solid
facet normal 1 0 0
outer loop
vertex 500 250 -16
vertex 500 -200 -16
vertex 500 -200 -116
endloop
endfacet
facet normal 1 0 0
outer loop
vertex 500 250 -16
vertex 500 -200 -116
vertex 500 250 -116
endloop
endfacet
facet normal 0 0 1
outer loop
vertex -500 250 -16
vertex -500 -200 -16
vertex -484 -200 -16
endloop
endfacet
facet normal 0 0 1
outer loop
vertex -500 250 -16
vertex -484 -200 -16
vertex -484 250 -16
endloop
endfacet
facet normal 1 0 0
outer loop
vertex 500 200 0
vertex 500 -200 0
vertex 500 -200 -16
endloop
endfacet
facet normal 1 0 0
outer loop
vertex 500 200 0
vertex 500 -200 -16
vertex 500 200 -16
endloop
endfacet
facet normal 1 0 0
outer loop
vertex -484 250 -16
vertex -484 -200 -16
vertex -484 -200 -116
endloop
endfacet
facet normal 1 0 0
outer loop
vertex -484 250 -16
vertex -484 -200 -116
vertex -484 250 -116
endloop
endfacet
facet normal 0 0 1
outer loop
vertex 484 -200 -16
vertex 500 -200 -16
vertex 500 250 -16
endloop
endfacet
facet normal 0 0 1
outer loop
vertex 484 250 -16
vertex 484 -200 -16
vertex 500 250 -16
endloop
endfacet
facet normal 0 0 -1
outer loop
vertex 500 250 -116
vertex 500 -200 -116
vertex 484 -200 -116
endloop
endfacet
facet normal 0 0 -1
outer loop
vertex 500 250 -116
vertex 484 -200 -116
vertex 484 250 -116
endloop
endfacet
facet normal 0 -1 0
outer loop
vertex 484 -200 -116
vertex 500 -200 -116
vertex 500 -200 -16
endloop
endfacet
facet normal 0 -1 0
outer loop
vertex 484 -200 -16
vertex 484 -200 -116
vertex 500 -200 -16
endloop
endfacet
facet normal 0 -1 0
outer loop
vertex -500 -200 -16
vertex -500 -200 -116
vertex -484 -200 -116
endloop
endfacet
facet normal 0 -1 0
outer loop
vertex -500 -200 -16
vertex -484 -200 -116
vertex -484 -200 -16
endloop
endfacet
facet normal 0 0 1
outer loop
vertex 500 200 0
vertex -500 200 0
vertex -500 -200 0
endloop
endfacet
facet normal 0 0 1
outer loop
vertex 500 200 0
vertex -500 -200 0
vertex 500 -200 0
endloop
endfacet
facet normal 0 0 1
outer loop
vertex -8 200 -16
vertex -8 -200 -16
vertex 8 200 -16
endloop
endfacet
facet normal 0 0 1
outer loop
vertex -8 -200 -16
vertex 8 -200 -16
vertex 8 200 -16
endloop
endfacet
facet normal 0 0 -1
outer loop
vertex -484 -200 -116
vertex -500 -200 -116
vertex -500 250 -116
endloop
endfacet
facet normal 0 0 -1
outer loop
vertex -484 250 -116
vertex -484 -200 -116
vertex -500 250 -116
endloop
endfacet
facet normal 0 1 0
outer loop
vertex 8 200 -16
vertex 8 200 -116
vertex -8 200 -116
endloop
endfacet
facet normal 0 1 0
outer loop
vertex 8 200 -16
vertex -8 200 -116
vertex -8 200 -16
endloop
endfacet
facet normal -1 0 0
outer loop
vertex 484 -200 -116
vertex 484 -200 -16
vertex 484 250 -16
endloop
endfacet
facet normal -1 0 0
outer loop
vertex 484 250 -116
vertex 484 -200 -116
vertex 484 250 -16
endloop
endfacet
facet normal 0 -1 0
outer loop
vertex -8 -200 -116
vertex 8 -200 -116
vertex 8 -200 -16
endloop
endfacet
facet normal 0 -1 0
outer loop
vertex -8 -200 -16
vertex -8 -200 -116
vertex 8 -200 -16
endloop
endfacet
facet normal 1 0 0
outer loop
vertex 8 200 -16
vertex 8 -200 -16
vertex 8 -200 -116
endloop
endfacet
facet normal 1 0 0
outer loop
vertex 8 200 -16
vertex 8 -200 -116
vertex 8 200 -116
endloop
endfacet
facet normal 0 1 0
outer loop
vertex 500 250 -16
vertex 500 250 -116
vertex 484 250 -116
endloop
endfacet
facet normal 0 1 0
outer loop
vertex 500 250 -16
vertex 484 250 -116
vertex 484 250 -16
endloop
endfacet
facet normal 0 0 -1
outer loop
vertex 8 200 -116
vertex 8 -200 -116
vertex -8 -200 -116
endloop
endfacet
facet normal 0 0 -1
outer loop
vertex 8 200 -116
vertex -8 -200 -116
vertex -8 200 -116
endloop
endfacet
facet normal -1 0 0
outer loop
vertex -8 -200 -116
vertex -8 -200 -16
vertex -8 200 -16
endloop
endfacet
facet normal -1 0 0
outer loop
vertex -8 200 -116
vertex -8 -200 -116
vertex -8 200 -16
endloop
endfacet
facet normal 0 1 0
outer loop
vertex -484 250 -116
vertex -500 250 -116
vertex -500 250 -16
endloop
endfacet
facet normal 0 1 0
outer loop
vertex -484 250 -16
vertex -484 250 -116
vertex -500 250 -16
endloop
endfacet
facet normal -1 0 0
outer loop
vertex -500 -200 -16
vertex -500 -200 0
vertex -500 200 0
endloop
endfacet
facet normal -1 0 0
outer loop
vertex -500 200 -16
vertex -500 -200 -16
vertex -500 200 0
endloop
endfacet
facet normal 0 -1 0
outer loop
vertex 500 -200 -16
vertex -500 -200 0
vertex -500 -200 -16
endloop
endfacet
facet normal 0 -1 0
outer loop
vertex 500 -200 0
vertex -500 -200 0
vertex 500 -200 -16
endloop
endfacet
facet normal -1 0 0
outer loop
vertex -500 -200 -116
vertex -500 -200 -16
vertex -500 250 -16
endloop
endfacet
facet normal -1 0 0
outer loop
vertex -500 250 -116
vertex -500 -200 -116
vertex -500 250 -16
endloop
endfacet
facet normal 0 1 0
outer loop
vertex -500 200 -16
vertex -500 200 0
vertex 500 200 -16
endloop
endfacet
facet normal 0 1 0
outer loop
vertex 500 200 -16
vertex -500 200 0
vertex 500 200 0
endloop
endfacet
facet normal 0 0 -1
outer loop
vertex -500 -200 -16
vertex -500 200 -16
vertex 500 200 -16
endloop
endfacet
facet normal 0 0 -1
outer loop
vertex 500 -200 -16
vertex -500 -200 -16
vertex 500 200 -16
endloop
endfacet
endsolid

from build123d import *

# Parameters (mm, degrees)
F0_W          = 1000
F0_H          = 400
F1_DEPTH      = 16
F3_W          = 450
F3_H          = 100
F4_DEPTH      = 16
F6_W          = 400
F6_H          = 100
F7_DEPTH      = 8
F7_DEPTH_BACK = 8


with BuildPart() as f1:
    # F0 (on Top) → F1 (new body)
    with BuildSketch(Plane.XY):
        Rectangle(F0_W, F0_H)
    extrude(amount=-F1_DEPTH)


with BuildPart() as f4:
    # F3 (on offset) → F4 (new body)
    with BuildSketch(Plane.YZ.offset(500)):
        with Locations((25, -66)):
            Rectangle(F3_W, F3_H)
    extrude(amount=-F4_DEPTH)


with BuildPart() as f5_1:
    # F5: instance of F4
    add(f4.part.mirror(Plane.YZ))


with BuildPart() as f7:
    # F6 (on Right) → F7 (new body, two sides)
    with BuildSketch(Plane.YZ) as f7_sk:
        with Locations((0, -66)):
            Rectangle(F6_W, F6_H)
    extrude(amount=F7_DEPTH)
    extrude(f7_sk.sketch, amount=-F7_DEPTH_BACK)


solid = Compound([f1.part, f4.part, f5_1.part, f7.part])
